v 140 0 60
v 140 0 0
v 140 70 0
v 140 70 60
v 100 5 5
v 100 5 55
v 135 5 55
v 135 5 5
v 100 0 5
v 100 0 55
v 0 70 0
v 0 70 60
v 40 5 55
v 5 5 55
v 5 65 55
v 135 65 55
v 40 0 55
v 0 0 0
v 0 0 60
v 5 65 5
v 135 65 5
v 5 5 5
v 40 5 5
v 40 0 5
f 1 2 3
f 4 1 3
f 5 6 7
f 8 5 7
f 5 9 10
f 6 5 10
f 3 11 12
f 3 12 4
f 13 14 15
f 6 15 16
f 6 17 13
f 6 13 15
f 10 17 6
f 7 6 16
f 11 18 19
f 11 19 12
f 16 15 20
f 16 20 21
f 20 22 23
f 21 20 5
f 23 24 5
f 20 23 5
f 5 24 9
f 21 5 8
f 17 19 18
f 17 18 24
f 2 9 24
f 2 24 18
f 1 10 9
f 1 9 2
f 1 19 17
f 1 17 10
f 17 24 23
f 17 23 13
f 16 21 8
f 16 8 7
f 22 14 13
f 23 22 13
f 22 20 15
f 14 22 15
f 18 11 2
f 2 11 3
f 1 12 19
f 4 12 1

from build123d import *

# Parameters (mm, degrees)
IZIM1_W                     = 140
IZIM1_H                     = 70
Y_KSEKLIK_EKSTR_ZYON1_DEPTH = 60
IZIM10_W                    = 130
IZIM10_H                    = 50
KES_EKSTR_ZYON6_DEPTH       = 65
IZIM12_W                    = 35
IZIM12_H                    = 50
Y_KSEKLIK_EKSTR_ZYON3_DEPTH = 5


with BuildPart() as part:
    # Çizim1 → Yükseklik-Ekstrüzyon1 (new body)
    with BuildSketch(Plane.XY):
        with Locations((70, 35)):
            Rectangle(IZIM1_W, IZIM1_H)
    extrude(amount=Y_KSEKLIK_EKSTR_ZYON1_DEPTH)

    # Çizim10 → Kes-Ekstrüzyon6 (cut)
    with BuildSketch(Plane.XZ):
        with Locations((70, 30)):
            Rectangle(IZIM10_W, IZIM10_H)
    extrude(amount=-KES_EKSTR_ZYON6_DEPTH, mode=Mode.SUBTRACT)

    # Çizim12 → Yükseklik-Ekstrüzyon3 (add)
    with BuildSketch(Plane.XZ):
        with Locations((22.5, 30)):
            Rectangle(IZIM12_W, IZIM12_H)
        with Locations((117.5, 30)):
            Rectangle(IZIM12_W, IZIM12_H)
    extrude(amount=-Y_KSEKLIK_EKSTR_ZYON3_DEPTH)


solid = part.part
